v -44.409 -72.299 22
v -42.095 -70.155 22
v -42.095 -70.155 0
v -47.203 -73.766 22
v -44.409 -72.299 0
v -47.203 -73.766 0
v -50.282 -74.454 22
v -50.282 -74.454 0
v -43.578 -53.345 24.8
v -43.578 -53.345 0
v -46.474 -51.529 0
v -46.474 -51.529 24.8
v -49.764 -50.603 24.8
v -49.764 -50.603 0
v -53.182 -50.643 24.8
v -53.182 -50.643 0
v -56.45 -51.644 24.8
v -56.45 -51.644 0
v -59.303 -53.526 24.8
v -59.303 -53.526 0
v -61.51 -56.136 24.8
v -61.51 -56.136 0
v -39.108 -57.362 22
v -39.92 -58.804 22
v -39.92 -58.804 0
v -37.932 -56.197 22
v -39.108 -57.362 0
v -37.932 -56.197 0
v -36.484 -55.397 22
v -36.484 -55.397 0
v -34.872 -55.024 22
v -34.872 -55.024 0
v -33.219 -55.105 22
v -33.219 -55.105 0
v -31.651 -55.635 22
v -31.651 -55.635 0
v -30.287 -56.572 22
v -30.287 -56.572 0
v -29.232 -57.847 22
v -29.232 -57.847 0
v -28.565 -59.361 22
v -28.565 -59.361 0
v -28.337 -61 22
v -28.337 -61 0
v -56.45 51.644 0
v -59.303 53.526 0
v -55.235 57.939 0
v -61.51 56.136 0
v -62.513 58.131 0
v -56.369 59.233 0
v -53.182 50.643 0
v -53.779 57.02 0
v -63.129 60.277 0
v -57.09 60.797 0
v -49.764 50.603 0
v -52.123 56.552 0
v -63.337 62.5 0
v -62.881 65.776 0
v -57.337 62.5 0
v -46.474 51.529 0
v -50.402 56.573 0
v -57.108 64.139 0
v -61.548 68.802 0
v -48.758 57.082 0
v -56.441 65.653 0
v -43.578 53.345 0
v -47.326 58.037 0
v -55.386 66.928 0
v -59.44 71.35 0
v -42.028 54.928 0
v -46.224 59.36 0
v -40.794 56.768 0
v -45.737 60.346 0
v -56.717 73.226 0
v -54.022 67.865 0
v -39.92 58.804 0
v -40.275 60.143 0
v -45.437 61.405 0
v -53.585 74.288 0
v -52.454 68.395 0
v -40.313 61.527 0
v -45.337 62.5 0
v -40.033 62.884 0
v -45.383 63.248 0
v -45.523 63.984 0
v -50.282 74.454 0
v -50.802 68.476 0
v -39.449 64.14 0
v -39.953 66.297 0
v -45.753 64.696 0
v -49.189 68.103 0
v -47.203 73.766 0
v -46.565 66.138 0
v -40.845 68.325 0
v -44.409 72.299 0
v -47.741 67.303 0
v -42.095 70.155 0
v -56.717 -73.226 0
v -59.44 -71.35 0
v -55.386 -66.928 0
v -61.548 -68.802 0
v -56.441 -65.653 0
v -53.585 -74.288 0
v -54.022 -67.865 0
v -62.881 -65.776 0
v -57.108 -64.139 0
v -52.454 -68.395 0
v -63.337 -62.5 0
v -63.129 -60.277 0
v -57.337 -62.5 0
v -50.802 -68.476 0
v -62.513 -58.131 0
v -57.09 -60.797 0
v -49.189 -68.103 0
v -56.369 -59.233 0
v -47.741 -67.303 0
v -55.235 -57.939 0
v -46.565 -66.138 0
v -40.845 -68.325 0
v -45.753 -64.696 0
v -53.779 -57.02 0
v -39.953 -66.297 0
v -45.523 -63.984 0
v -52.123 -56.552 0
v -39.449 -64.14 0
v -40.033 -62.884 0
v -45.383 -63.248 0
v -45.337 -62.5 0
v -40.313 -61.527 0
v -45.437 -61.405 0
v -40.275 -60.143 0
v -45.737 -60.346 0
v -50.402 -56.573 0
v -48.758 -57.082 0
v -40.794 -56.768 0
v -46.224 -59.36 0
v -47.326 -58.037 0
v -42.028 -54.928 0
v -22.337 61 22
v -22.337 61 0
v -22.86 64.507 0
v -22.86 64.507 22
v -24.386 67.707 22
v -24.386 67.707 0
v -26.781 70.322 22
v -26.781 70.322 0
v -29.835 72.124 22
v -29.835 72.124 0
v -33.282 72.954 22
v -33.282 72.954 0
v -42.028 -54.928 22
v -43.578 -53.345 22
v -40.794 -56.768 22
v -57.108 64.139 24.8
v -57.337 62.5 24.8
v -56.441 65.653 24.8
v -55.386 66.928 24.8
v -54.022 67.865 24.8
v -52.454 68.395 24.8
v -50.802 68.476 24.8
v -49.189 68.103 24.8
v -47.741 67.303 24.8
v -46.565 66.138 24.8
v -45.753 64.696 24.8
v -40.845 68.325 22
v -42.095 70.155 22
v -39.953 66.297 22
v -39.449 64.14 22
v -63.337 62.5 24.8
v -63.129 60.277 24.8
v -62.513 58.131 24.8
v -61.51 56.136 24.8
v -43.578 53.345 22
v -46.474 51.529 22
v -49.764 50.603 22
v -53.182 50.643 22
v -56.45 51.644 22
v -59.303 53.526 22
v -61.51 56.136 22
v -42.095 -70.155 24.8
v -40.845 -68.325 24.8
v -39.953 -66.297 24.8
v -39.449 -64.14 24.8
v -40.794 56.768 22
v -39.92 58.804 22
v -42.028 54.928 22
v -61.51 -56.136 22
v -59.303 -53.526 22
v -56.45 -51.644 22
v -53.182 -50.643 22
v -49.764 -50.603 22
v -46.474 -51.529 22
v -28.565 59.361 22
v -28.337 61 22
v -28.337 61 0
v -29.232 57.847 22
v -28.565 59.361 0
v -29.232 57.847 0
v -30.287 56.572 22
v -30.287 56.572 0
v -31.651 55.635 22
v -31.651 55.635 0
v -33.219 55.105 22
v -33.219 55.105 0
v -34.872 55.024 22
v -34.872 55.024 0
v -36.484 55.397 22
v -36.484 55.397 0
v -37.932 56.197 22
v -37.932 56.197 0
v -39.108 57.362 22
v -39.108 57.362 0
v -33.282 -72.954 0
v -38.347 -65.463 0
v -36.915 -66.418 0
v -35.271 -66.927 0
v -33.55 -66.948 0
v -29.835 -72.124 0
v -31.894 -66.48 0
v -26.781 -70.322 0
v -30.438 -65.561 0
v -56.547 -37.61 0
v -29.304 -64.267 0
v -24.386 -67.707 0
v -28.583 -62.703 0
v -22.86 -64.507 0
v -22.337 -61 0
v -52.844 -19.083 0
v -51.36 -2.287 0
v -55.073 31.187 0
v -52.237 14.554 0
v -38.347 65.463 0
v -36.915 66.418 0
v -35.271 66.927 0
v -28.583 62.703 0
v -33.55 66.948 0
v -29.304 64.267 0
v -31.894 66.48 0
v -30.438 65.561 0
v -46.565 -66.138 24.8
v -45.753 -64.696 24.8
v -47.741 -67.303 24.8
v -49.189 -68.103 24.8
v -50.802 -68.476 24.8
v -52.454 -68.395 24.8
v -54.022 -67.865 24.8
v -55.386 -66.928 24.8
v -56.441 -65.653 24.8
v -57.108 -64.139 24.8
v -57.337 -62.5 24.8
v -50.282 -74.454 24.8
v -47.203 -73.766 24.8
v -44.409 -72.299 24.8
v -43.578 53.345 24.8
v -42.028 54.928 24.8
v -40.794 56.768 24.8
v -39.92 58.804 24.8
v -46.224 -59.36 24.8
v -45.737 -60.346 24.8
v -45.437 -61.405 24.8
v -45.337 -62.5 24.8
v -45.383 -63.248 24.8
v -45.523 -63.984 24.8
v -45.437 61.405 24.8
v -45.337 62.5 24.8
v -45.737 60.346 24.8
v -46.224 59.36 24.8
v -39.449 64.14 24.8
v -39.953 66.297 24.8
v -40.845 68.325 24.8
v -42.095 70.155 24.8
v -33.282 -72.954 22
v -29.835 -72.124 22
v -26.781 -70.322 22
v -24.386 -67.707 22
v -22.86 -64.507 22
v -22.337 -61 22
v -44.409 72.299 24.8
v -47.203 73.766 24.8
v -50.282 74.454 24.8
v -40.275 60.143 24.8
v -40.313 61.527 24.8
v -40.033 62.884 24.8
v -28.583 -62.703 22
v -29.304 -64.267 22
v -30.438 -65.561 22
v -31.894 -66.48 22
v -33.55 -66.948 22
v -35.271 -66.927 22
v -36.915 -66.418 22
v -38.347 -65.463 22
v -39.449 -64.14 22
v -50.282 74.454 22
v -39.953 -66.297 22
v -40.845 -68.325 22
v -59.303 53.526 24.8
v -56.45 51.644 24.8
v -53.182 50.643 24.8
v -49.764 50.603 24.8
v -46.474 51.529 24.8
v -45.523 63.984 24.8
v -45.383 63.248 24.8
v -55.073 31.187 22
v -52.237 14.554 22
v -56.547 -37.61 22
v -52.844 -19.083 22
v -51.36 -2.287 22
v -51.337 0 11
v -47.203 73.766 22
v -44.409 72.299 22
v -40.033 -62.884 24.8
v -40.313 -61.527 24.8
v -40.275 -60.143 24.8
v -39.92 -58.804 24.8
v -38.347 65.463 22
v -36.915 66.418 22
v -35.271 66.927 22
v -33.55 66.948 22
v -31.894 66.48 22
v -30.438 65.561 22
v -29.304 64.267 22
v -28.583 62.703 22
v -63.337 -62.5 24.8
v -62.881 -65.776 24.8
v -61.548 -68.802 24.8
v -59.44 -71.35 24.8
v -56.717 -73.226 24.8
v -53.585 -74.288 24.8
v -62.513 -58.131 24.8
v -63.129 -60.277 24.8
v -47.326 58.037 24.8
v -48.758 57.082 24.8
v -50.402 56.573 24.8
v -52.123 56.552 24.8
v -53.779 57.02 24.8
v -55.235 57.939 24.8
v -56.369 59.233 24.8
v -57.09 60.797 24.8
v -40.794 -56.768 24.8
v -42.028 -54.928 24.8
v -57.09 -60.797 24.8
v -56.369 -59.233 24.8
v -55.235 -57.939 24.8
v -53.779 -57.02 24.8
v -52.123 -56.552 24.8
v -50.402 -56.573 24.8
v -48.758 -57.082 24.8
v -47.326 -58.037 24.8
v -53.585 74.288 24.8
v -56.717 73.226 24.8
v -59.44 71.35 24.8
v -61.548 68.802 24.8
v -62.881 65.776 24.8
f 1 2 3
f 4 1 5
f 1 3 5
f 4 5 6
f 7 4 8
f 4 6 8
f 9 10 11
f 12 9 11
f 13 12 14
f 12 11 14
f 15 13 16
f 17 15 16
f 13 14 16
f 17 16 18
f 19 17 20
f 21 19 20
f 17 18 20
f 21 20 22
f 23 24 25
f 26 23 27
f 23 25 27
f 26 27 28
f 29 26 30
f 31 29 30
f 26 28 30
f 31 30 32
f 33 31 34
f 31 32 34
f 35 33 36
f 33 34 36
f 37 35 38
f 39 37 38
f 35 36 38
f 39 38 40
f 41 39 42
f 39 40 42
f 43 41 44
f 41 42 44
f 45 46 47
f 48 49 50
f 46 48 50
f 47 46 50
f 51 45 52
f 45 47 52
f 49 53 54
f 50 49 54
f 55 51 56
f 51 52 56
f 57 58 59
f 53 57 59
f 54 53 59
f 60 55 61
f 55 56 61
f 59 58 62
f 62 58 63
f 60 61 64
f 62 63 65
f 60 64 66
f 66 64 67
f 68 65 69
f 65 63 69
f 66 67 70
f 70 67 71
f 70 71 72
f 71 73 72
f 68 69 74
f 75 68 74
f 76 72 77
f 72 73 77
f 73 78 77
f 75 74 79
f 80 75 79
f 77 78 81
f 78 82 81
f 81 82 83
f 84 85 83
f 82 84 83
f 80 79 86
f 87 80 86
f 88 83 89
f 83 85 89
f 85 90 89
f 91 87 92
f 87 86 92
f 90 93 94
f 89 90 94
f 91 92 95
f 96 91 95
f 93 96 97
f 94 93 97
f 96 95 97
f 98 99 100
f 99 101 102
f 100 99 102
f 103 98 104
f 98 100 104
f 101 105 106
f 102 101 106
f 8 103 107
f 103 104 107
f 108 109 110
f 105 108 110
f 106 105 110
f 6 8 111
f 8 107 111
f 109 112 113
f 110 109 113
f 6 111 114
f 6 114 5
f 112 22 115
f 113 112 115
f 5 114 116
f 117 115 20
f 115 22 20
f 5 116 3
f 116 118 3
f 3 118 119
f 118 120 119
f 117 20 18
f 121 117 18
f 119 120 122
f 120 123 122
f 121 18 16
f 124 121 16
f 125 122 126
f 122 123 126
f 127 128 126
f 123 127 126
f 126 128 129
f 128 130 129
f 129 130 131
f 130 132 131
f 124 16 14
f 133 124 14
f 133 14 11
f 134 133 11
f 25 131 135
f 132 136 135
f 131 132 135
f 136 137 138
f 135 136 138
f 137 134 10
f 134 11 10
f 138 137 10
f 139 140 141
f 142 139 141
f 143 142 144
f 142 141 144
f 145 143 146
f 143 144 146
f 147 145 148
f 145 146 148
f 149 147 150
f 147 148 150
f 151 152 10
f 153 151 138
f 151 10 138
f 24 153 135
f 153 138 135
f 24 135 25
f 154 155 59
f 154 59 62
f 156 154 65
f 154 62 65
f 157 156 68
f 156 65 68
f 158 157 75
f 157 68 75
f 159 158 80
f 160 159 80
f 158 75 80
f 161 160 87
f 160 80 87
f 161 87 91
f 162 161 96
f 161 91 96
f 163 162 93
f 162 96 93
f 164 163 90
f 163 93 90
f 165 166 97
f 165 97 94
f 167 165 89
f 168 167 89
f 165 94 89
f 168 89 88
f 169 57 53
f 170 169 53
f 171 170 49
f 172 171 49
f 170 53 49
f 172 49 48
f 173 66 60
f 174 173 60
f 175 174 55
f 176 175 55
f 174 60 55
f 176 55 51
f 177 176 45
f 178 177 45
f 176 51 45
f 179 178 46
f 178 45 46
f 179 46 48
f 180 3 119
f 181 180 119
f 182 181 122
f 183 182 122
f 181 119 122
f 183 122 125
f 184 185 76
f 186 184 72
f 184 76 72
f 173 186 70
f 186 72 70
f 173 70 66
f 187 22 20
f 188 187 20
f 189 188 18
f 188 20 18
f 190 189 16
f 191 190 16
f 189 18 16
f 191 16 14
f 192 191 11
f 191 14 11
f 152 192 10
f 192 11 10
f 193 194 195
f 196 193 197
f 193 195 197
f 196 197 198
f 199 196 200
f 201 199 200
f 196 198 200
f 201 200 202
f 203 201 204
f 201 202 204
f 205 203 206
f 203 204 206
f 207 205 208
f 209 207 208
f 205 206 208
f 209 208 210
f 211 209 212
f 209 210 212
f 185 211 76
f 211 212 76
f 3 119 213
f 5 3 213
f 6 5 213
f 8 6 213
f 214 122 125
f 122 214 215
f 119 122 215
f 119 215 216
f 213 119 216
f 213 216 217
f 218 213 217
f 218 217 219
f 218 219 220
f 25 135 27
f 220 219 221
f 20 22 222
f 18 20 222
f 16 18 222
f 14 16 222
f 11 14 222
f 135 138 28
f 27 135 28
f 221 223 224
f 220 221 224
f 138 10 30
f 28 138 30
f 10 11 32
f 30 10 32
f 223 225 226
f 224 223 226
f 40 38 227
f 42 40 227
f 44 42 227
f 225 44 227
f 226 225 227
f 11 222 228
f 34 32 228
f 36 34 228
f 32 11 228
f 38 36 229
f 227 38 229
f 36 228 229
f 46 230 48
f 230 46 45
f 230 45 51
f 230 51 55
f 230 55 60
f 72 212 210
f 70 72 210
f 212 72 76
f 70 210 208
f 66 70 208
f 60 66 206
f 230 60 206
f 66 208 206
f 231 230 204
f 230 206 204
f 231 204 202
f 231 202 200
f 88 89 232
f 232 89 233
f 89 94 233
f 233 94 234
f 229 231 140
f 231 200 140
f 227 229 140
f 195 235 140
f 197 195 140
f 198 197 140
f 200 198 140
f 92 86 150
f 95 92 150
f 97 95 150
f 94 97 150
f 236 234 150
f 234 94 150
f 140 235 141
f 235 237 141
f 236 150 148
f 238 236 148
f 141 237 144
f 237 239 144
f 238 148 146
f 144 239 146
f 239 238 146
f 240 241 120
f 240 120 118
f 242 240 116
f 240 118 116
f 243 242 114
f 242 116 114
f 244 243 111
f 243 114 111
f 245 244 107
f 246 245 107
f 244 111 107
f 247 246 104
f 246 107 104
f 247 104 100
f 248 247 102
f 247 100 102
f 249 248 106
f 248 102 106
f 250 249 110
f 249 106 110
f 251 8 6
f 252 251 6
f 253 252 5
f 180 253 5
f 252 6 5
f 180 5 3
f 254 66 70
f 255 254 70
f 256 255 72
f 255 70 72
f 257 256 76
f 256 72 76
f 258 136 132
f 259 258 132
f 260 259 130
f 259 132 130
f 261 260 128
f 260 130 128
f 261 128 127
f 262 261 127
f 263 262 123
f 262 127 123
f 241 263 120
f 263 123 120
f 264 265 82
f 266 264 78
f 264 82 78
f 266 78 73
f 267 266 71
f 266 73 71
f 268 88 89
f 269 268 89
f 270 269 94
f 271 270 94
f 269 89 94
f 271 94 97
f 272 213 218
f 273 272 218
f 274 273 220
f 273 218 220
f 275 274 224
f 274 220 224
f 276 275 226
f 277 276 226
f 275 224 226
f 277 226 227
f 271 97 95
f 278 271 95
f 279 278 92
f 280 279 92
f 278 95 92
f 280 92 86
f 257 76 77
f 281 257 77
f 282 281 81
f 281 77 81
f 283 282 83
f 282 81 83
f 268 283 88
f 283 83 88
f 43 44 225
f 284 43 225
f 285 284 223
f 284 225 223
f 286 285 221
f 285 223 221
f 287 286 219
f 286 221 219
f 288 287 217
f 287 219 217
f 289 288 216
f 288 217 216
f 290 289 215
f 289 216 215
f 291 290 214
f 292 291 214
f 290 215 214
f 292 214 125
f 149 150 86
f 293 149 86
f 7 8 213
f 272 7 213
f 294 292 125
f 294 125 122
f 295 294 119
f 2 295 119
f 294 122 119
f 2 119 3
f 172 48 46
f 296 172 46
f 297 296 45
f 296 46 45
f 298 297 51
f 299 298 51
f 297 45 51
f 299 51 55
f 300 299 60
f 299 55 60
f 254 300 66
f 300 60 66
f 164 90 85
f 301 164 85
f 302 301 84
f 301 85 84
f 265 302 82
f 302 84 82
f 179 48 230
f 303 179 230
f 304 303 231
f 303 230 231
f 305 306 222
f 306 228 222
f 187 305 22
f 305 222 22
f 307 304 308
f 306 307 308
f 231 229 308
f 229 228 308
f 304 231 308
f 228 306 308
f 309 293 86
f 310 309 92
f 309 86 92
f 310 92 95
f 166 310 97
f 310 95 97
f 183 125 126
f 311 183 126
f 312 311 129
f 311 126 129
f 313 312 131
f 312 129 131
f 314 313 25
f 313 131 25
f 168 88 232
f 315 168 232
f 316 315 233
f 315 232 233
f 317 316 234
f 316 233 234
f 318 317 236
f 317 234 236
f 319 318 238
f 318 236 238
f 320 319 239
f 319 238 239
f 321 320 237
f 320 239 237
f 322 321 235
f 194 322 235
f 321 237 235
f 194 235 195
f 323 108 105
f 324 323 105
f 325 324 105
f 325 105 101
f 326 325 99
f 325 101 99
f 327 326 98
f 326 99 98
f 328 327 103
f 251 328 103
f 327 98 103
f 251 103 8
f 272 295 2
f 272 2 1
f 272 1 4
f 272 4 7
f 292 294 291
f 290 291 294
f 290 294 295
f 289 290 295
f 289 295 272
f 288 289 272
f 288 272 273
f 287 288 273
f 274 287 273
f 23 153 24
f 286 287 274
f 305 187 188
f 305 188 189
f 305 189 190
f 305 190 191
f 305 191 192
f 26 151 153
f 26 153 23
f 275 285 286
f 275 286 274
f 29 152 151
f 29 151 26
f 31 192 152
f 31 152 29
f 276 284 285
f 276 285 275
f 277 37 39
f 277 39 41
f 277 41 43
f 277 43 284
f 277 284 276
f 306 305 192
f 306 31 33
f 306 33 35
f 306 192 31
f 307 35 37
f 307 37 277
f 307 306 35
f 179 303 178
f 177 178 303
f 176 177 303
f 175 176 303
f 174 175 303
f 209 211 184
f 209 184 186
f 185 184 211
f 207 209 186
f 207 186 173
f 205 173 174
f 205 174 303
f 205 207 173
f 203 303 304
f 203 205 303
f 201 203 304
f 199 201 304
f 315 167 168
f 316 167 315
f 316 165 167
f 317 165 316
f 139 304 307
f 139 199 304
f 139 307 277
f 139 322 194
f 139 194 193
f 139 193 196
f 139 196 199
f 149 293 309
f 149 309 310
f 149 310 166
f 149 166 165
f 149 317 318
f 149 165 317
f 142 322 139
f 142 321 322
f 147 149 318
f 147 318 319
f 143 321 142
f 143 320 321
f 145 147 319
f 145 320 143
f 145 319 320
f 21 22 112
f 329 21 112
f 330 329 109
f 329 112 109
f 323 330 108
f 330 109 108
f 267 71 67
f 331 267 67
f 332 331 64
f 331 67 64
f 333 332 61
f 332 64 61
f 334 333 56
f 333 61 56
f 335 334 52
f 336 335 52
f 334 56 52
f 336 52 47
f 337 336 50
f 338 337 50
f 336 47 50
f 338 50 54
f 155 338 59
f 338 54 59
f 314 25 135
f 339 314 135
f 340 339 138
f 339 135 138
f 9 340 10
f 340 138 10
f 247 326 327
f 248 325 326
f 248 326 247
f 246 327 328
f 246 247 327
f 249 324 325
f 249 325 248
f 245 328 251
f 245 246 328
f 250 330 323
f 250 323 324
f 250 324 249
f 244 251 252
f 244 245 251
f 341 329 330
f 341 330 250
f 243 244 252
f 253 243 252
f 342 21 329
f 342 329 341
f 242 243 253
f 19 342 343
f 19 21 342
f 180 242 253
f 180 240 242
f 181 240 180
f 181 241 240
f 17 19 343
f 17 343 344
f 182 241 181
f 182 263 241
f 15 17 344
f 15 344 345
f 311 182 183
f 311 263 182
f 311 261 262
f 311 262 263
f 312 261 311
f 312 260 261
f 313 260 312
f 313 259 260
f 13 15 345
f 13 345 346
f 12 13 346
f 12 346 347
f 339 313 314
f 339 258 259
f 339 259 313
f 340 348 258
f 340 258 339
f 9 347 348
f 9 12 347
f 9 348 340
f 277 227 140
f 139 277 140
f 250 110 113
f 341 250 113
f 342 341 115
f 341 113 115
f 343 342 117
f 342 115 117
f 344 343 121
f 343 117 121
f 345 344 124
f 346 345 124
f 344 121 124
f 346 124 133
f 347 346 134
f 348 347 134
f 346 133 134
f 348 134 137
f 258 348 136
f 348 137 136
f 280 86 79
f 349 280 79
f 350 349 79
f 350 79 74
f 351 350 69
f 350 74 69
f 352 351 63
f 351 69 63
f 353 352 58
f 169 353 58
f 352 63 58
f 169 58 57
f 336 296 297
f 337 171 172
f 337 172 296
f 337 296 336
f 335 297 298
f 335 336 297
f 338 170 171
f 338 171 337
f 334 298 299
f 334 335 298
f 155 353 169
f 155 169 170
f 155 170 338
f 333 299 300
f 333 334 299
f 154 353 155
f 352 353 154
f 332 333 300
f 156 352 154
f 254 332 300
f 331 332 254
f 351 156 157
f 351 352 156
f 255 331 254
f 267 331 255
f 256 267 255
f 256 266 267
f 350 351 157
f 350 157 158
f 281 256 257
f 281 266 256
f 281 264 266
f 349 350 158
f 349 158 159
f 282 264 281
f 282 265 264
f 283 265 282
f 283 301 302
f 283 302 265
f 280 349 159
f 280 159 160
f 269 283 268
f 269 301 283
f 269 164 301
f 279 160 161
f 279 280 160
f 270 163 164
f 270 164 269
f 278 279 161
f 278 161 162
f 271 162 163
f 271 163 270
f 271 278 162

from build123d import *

# Parameters (mm, degrees)
F1_DEPTH = 24.8
F2_DEPTH = 22


with BuildPart() as f1:
    # F0 (on Top) → F1 (new body)
    with BuildSketch(Plane.XY):
        with BuildLine():
            ThreePointArc((-45.7530588014, 64.6964537546), (-44.3048758636, 67.6807833959), (-42.0949857485, 70.1546150208))
            ThreePointArc((-42.0949857485, 70.1546150208), (-45.7577053005, 73.1243246873), (-50.2818437032, 74.4535582003))
            ThreePointArc((-50.2818437032, 74.4535582003), (-59.4403738209, 71.3503307476), (-63.3365694268, 62.5))
            Line((-63.3365694268, 62.5), (-57.3365694268, 62.5))
            ThreePointArc((-57.3365694268, 62.5), (-52.4543655279, 68.3949581743), (-45.7530588014, 64.6964537546))
        make_face()
        with BuildLine():
            ThreePointArc((-61.5100983435, 56.1360932298), (-53.1818892762, 50.642732412), (-43.5781531051, 53.3453849792))
            ThreePointArc((-43.5781531051, 53.3453849792), (-45.3207130283, 56.1679621957), (-46.2239427131, 59.3597694214))
            ThreePointArc((-46.2239427131, 59.3597694214), (-52.9681698249, 56.7261035564), (-57.3365694268, 62.5))
            Line((-57.3365694268, 62.5), (-63.3365694268, 62.5))
            add(Edge.make_bspline(
                [(-63.3365694268, 62.5), (-62.7256343768, 60.3786977433), (-62.1146993269, 58.2573954865), (-61.5100983436, 56.1360932298)],
                knots=[0, 0, 0, 0, 0.0509112542, 0.0509112542, 0.0509112542, 0.0509112542], degree=3))
        make_face()
        with BuildLine():
            ThreePointArc((-39.9200800522, 58.8035462454), (-40.3133485269, 61.5273628618), (-39.4491961404, 64.1402305786))
            ThreePointArc((-39.4491961404, 64.1402305786), (-40.3524258253, 67.3320378043), (-42.0949857485, 70.1546150208))
            ThreePointArc((-42.0949857485, 70.1546150208), (-44.3048758636, 67.6807833959), (-45.7530588014, 64.6964537546))
            ThreePointArc((-45.7530588014, 64.6964537546), (-45.4416112525, 63.6177961012), (-45.3365694268, 62.5))
            ThreePointArc((-45.3365694268, 62.5), (-45.5626729832, 60.8683996019), (-46.2239427131, 59.3597694214))
            ThreePointArc((-46.2239427131, 59.3597694214), (-45.3207130283, 56.1679621957), (-43.5781531051, 53.3453849792))
            ThreePointArc((-43.5781531051, 53.3453849792), (-41.36826299, 55.8192166041), (-39.9200800522, 58.8035462454))
        make_face()
        with BuildLine():
            ThreePointArc((-63.3365694268, 62.5), (-62.870916981, 59.1895881677), (-61.5100983435, 56.1360932298))
            add(Edge.make_bspline(
                [(-63.3365694268, 62.5), (-62.7256343768, 60.3786977433), (-62.1146993269, 58.2573954865), (-61.5100983436, 56.1360932298)],
                knots=[0, 0, 0, 0, 0.0509112542, 0.0509112542, 0.0509112542, 0.0509112542], degree=3))
        make_face()
    extrude(amount=F1_DEPTH)


with BuildPart() as f1b:
    # F0 (on Top) → F1, piece 2 (new body)
    with BuildSketch(Plane.XY):
        with BuildLine():
            ThreePointArc((-43.5781531051, -53.3453849792), (-53.1818892762, -50.642732412), (-61.5100983435, -56.1360932298))
            add(Edge.make_bspline(
                [(-61.5100983436, -56.1360932298), (-62.1146993269, -58.2573954865), (-62.7256343768, -60.3786977433), (-63.3365694268, -62.5)],
                knots=[0.9490887458, 0.9490887458, 0.9490887458, 0.9490887458, 1, 1, 1, 1], degree=3))
            Line((-63.3365694268, -62.5), (-57.3365694268, -62.5))
            ThreePointArc((-57.3365694268, -62.5), (-52.9681698249, -56.7261035564), (-46.2239427131, -59.3597694214))
            ThreePointArc((-46.2239427131, -59.3597694214), (-45.3207130283, -56.1679621957), (-43.5781531051, -53.3453849792))
        make_face()
        with BuildLine():
            add(Edge.make_bspline(
                [(-61.5100983436, -56.1360932298), (-62.1146993269, -58.2573954865), (-62.7256343768, -60.3786977433), (-63.3365694268, -62.5)],
                knots=[0.9490887458, 0.9490887458, 0.9490887458, 0.9490887458, 1, 1, 1, 1], degree=3))
            ThreePointArc((-61.5100983435, -56.1360932298), (-62.870916981, -59.1895881677), (-63.3365694268, -62.5))
        make_face()
        with BuildLine():
            Line((-57.3365694268, -62.5), (-63.3365694268, -62.5))
            ThreePointArc((-63.3365694268, -62.5), (-59.4403738209, -71.3503307476), (-50.2818437032, -74.4535582003))
            ThreePointArc((-50.2818437032, -74.4535582003), (-45.7577053005, -73.1243246873), (-42.0949857485, -70.1546150208))
            ThreePointArc((-42.0949857485, -70.1546150208), (-44.3048758636, -67.6807833959), (-45.7530588014, -64.6964537546))
            ThreePointArc((-45.7530588014, -64.6964537546), (-52.4543655279, -68.3949581743), (-57.3365694268, -62.5))
        make_face()
        with BuildLine():
            ThreePointArc((-39.9200800522, -58.8035462454), (-41.36826299, -55.8192166041), (-43.5781531051, -53.3453849792))
            ThreePointArc((-43.5781531051, -53.3453849792), (-45.3207130283, -56.1679621957), (-46.2239427131, -59.3597694214))
            ThreePointArc((-46.2239427131, -59.3597694214), (-45.5626729832, -60.8683996019), (-45.3365694268, -62.5))
            ThreePointArc((-45.3365694268, -62.5), (-45.4416112525, -63.6177961012), (-45.7530588014, -64.6964537546))
            ThreePointArc((-45.7530588014, -64.6964537546), (-44.3048758636, -67.6807833959), (-42.0949857485, -70.1546150208))
            ThreePointArc((-42.0949857485, -70.1546150208), (-40.3524258253, -67.3320378043), (-39.4491961404, -64.1402305786))
            ThreePointArc((-39.4491961404, -64.1402305786), (-40.3133485269, -61.5273628618), (-39.9200800522, -58.8035462454))
        make_face()
    extrude(amount=F1_DEPTH)


with BuildPart() as f2:
    # F0 (on Top) → F2 (new body)
    with BuildSketch(Plane.XY):
        with BuildLine():
            ThreePointArc((-22.3365694268, 61), (-30.2683391076, 49.7106465167), (-43.5781531051, 53.3453849792))
            ThreePointArc((-43.5781531051, 53.3453849792), (-53.1818892762, 50.642732412), (-61.5100983435, 56.1360932298))
            add(Edge.make_bspline(
                [(-61.5100983436, 56.1360932298), (-56.1769062661, 37.4240621532), (-46.4962325874, 0), (-56.1769062661, -37.4240621532), (-61.5100983436, -56.1360932298)],
                knots=[0.0509112542, 0.0509112542, 0.0509112542, 0.0509112542, 0.5, 0.9490887458, 0.9490887458, 0.9490887458, 0.9490887458], degree=3))
            ThreePointArc((-61.5100983435, -56.1360932298), (-53.1818892762, -50.642732412), (-43.5781531051, -53.3453849792))
            ThreePointArc((-43.5781531051, -53.3453849792), (-30.2683391076, -49.7106465167), (-22.3365694268, -61))
            Line((-22.3365694268, -61), (-22.3365694268, 61))
        make_face()
        with BuildLine():
            Line((-28.3365694268, -61), (-22.3365694268, -61))
            ThreePointArc((-22.3365694268, -61), (-30.2683391076, -49.7106465167), (-43.5781531051, -53.3453849792))
            ThreePointArc((-43.5781531051, -53.3453849792), (-41.36826299, -55.8192166041), (-39.9200800522, -58.8035462454))
            ThreePointArc((-39.9200800522, -58.8035462454), (-33.2187733256, -55.1050418257), (-28.3365694268, -61))
        make_face()
        with BuildLine():
            ThreePointArc((-33.2818437032, -72.9535582003), (-25.4862386792, -69.1038043942), (-22.3365694268, -61))
            Line((-22.3365694268, -61), (-28.3365694268, -61))
            ThreePointArc((-28.3365694268, -61), (-32.7049690287, -66.7738964436), (-39.4491961404, -64.1402305786))
            ThreePointArc((-39.4491961404, -64.1402305786), (-40.3524258253, -67.3320378043), (-42.0949857485, -70.1546150208))
            ThreePointArc((-42.0949857485, -70.1546150208), (-37.9688397415, -72.4370718438), (-33.2818437032, -72.9535582003))
        make_face()
        with BuildLine():
            ThreePointArc((-39.4491961404, 64.1402305786), (-32.7049690287, 66.7738964436), (-28.3365694268, 61))
            ThreePointArc((-28.3365694268, 61), (-33.2187733256, 55.1050418257), (-39.9200800522, 58.8035462454))
            ThreePointArc((-39.9200800522, 58.8035462454), (-41.36826299, 55.8192166041), (-43.5781531051, 53.3453849792))
            ThreePointArc((-43.5781531051, 53.3453849792), (-30.2683391076, 49.7106465167), (-22.3365694268, 61))
            ThreePointArc((-22.3365694268, 61), (-25.4862386792, 69.1038043942), (-33.2818437032, 72.9535582003))
            ThreePointArc((-33.2818437032, 72.9535582003), (-37.9688397415, 72.4370718438), (-42.0949857485, 70.1546150208))
            ThreePointArc((-42.0949857485, 70.1546150208), (-40.3524258253, 67.3320378043), (-39.4491961404, 64.1402305786))
        make_face()
        with BuildLine():
            Line((-50.2818437032, -74.4535582003), (-33.2818437032, -72.9535582003))
            ThreePointArc((-33.2818437032, -72.9535582003), (-37.9688397415, -72.4370718438), (-42.0949857485, -70.1546150208))
            ThreePointArc((-42.0949857485, -70.1546150208), (-45.7577053005, -73.1243246873), (-50.2818437032, -74.4535582003))
        make_face()
        with BuildLine():
            ThreePointArc((-50.2818437032, 74.4535582003), (-45.7577053005, 73.1243246873), (-42.0949857485, 70.1546150208))
            ThreePointArc((-42.0949857485, 70.1546150208), (-37.9688397415, 72.4370718438), (-33.2818437032, 72.9535582003))
            Line((-33.2818437032, 72.9535582003), (-50.2818437032, 74.4535582003))
        make_face()
    extrude(amount=F2_DEPTH)


solid = Compound([f1.part, f1b.part, f2.part])
